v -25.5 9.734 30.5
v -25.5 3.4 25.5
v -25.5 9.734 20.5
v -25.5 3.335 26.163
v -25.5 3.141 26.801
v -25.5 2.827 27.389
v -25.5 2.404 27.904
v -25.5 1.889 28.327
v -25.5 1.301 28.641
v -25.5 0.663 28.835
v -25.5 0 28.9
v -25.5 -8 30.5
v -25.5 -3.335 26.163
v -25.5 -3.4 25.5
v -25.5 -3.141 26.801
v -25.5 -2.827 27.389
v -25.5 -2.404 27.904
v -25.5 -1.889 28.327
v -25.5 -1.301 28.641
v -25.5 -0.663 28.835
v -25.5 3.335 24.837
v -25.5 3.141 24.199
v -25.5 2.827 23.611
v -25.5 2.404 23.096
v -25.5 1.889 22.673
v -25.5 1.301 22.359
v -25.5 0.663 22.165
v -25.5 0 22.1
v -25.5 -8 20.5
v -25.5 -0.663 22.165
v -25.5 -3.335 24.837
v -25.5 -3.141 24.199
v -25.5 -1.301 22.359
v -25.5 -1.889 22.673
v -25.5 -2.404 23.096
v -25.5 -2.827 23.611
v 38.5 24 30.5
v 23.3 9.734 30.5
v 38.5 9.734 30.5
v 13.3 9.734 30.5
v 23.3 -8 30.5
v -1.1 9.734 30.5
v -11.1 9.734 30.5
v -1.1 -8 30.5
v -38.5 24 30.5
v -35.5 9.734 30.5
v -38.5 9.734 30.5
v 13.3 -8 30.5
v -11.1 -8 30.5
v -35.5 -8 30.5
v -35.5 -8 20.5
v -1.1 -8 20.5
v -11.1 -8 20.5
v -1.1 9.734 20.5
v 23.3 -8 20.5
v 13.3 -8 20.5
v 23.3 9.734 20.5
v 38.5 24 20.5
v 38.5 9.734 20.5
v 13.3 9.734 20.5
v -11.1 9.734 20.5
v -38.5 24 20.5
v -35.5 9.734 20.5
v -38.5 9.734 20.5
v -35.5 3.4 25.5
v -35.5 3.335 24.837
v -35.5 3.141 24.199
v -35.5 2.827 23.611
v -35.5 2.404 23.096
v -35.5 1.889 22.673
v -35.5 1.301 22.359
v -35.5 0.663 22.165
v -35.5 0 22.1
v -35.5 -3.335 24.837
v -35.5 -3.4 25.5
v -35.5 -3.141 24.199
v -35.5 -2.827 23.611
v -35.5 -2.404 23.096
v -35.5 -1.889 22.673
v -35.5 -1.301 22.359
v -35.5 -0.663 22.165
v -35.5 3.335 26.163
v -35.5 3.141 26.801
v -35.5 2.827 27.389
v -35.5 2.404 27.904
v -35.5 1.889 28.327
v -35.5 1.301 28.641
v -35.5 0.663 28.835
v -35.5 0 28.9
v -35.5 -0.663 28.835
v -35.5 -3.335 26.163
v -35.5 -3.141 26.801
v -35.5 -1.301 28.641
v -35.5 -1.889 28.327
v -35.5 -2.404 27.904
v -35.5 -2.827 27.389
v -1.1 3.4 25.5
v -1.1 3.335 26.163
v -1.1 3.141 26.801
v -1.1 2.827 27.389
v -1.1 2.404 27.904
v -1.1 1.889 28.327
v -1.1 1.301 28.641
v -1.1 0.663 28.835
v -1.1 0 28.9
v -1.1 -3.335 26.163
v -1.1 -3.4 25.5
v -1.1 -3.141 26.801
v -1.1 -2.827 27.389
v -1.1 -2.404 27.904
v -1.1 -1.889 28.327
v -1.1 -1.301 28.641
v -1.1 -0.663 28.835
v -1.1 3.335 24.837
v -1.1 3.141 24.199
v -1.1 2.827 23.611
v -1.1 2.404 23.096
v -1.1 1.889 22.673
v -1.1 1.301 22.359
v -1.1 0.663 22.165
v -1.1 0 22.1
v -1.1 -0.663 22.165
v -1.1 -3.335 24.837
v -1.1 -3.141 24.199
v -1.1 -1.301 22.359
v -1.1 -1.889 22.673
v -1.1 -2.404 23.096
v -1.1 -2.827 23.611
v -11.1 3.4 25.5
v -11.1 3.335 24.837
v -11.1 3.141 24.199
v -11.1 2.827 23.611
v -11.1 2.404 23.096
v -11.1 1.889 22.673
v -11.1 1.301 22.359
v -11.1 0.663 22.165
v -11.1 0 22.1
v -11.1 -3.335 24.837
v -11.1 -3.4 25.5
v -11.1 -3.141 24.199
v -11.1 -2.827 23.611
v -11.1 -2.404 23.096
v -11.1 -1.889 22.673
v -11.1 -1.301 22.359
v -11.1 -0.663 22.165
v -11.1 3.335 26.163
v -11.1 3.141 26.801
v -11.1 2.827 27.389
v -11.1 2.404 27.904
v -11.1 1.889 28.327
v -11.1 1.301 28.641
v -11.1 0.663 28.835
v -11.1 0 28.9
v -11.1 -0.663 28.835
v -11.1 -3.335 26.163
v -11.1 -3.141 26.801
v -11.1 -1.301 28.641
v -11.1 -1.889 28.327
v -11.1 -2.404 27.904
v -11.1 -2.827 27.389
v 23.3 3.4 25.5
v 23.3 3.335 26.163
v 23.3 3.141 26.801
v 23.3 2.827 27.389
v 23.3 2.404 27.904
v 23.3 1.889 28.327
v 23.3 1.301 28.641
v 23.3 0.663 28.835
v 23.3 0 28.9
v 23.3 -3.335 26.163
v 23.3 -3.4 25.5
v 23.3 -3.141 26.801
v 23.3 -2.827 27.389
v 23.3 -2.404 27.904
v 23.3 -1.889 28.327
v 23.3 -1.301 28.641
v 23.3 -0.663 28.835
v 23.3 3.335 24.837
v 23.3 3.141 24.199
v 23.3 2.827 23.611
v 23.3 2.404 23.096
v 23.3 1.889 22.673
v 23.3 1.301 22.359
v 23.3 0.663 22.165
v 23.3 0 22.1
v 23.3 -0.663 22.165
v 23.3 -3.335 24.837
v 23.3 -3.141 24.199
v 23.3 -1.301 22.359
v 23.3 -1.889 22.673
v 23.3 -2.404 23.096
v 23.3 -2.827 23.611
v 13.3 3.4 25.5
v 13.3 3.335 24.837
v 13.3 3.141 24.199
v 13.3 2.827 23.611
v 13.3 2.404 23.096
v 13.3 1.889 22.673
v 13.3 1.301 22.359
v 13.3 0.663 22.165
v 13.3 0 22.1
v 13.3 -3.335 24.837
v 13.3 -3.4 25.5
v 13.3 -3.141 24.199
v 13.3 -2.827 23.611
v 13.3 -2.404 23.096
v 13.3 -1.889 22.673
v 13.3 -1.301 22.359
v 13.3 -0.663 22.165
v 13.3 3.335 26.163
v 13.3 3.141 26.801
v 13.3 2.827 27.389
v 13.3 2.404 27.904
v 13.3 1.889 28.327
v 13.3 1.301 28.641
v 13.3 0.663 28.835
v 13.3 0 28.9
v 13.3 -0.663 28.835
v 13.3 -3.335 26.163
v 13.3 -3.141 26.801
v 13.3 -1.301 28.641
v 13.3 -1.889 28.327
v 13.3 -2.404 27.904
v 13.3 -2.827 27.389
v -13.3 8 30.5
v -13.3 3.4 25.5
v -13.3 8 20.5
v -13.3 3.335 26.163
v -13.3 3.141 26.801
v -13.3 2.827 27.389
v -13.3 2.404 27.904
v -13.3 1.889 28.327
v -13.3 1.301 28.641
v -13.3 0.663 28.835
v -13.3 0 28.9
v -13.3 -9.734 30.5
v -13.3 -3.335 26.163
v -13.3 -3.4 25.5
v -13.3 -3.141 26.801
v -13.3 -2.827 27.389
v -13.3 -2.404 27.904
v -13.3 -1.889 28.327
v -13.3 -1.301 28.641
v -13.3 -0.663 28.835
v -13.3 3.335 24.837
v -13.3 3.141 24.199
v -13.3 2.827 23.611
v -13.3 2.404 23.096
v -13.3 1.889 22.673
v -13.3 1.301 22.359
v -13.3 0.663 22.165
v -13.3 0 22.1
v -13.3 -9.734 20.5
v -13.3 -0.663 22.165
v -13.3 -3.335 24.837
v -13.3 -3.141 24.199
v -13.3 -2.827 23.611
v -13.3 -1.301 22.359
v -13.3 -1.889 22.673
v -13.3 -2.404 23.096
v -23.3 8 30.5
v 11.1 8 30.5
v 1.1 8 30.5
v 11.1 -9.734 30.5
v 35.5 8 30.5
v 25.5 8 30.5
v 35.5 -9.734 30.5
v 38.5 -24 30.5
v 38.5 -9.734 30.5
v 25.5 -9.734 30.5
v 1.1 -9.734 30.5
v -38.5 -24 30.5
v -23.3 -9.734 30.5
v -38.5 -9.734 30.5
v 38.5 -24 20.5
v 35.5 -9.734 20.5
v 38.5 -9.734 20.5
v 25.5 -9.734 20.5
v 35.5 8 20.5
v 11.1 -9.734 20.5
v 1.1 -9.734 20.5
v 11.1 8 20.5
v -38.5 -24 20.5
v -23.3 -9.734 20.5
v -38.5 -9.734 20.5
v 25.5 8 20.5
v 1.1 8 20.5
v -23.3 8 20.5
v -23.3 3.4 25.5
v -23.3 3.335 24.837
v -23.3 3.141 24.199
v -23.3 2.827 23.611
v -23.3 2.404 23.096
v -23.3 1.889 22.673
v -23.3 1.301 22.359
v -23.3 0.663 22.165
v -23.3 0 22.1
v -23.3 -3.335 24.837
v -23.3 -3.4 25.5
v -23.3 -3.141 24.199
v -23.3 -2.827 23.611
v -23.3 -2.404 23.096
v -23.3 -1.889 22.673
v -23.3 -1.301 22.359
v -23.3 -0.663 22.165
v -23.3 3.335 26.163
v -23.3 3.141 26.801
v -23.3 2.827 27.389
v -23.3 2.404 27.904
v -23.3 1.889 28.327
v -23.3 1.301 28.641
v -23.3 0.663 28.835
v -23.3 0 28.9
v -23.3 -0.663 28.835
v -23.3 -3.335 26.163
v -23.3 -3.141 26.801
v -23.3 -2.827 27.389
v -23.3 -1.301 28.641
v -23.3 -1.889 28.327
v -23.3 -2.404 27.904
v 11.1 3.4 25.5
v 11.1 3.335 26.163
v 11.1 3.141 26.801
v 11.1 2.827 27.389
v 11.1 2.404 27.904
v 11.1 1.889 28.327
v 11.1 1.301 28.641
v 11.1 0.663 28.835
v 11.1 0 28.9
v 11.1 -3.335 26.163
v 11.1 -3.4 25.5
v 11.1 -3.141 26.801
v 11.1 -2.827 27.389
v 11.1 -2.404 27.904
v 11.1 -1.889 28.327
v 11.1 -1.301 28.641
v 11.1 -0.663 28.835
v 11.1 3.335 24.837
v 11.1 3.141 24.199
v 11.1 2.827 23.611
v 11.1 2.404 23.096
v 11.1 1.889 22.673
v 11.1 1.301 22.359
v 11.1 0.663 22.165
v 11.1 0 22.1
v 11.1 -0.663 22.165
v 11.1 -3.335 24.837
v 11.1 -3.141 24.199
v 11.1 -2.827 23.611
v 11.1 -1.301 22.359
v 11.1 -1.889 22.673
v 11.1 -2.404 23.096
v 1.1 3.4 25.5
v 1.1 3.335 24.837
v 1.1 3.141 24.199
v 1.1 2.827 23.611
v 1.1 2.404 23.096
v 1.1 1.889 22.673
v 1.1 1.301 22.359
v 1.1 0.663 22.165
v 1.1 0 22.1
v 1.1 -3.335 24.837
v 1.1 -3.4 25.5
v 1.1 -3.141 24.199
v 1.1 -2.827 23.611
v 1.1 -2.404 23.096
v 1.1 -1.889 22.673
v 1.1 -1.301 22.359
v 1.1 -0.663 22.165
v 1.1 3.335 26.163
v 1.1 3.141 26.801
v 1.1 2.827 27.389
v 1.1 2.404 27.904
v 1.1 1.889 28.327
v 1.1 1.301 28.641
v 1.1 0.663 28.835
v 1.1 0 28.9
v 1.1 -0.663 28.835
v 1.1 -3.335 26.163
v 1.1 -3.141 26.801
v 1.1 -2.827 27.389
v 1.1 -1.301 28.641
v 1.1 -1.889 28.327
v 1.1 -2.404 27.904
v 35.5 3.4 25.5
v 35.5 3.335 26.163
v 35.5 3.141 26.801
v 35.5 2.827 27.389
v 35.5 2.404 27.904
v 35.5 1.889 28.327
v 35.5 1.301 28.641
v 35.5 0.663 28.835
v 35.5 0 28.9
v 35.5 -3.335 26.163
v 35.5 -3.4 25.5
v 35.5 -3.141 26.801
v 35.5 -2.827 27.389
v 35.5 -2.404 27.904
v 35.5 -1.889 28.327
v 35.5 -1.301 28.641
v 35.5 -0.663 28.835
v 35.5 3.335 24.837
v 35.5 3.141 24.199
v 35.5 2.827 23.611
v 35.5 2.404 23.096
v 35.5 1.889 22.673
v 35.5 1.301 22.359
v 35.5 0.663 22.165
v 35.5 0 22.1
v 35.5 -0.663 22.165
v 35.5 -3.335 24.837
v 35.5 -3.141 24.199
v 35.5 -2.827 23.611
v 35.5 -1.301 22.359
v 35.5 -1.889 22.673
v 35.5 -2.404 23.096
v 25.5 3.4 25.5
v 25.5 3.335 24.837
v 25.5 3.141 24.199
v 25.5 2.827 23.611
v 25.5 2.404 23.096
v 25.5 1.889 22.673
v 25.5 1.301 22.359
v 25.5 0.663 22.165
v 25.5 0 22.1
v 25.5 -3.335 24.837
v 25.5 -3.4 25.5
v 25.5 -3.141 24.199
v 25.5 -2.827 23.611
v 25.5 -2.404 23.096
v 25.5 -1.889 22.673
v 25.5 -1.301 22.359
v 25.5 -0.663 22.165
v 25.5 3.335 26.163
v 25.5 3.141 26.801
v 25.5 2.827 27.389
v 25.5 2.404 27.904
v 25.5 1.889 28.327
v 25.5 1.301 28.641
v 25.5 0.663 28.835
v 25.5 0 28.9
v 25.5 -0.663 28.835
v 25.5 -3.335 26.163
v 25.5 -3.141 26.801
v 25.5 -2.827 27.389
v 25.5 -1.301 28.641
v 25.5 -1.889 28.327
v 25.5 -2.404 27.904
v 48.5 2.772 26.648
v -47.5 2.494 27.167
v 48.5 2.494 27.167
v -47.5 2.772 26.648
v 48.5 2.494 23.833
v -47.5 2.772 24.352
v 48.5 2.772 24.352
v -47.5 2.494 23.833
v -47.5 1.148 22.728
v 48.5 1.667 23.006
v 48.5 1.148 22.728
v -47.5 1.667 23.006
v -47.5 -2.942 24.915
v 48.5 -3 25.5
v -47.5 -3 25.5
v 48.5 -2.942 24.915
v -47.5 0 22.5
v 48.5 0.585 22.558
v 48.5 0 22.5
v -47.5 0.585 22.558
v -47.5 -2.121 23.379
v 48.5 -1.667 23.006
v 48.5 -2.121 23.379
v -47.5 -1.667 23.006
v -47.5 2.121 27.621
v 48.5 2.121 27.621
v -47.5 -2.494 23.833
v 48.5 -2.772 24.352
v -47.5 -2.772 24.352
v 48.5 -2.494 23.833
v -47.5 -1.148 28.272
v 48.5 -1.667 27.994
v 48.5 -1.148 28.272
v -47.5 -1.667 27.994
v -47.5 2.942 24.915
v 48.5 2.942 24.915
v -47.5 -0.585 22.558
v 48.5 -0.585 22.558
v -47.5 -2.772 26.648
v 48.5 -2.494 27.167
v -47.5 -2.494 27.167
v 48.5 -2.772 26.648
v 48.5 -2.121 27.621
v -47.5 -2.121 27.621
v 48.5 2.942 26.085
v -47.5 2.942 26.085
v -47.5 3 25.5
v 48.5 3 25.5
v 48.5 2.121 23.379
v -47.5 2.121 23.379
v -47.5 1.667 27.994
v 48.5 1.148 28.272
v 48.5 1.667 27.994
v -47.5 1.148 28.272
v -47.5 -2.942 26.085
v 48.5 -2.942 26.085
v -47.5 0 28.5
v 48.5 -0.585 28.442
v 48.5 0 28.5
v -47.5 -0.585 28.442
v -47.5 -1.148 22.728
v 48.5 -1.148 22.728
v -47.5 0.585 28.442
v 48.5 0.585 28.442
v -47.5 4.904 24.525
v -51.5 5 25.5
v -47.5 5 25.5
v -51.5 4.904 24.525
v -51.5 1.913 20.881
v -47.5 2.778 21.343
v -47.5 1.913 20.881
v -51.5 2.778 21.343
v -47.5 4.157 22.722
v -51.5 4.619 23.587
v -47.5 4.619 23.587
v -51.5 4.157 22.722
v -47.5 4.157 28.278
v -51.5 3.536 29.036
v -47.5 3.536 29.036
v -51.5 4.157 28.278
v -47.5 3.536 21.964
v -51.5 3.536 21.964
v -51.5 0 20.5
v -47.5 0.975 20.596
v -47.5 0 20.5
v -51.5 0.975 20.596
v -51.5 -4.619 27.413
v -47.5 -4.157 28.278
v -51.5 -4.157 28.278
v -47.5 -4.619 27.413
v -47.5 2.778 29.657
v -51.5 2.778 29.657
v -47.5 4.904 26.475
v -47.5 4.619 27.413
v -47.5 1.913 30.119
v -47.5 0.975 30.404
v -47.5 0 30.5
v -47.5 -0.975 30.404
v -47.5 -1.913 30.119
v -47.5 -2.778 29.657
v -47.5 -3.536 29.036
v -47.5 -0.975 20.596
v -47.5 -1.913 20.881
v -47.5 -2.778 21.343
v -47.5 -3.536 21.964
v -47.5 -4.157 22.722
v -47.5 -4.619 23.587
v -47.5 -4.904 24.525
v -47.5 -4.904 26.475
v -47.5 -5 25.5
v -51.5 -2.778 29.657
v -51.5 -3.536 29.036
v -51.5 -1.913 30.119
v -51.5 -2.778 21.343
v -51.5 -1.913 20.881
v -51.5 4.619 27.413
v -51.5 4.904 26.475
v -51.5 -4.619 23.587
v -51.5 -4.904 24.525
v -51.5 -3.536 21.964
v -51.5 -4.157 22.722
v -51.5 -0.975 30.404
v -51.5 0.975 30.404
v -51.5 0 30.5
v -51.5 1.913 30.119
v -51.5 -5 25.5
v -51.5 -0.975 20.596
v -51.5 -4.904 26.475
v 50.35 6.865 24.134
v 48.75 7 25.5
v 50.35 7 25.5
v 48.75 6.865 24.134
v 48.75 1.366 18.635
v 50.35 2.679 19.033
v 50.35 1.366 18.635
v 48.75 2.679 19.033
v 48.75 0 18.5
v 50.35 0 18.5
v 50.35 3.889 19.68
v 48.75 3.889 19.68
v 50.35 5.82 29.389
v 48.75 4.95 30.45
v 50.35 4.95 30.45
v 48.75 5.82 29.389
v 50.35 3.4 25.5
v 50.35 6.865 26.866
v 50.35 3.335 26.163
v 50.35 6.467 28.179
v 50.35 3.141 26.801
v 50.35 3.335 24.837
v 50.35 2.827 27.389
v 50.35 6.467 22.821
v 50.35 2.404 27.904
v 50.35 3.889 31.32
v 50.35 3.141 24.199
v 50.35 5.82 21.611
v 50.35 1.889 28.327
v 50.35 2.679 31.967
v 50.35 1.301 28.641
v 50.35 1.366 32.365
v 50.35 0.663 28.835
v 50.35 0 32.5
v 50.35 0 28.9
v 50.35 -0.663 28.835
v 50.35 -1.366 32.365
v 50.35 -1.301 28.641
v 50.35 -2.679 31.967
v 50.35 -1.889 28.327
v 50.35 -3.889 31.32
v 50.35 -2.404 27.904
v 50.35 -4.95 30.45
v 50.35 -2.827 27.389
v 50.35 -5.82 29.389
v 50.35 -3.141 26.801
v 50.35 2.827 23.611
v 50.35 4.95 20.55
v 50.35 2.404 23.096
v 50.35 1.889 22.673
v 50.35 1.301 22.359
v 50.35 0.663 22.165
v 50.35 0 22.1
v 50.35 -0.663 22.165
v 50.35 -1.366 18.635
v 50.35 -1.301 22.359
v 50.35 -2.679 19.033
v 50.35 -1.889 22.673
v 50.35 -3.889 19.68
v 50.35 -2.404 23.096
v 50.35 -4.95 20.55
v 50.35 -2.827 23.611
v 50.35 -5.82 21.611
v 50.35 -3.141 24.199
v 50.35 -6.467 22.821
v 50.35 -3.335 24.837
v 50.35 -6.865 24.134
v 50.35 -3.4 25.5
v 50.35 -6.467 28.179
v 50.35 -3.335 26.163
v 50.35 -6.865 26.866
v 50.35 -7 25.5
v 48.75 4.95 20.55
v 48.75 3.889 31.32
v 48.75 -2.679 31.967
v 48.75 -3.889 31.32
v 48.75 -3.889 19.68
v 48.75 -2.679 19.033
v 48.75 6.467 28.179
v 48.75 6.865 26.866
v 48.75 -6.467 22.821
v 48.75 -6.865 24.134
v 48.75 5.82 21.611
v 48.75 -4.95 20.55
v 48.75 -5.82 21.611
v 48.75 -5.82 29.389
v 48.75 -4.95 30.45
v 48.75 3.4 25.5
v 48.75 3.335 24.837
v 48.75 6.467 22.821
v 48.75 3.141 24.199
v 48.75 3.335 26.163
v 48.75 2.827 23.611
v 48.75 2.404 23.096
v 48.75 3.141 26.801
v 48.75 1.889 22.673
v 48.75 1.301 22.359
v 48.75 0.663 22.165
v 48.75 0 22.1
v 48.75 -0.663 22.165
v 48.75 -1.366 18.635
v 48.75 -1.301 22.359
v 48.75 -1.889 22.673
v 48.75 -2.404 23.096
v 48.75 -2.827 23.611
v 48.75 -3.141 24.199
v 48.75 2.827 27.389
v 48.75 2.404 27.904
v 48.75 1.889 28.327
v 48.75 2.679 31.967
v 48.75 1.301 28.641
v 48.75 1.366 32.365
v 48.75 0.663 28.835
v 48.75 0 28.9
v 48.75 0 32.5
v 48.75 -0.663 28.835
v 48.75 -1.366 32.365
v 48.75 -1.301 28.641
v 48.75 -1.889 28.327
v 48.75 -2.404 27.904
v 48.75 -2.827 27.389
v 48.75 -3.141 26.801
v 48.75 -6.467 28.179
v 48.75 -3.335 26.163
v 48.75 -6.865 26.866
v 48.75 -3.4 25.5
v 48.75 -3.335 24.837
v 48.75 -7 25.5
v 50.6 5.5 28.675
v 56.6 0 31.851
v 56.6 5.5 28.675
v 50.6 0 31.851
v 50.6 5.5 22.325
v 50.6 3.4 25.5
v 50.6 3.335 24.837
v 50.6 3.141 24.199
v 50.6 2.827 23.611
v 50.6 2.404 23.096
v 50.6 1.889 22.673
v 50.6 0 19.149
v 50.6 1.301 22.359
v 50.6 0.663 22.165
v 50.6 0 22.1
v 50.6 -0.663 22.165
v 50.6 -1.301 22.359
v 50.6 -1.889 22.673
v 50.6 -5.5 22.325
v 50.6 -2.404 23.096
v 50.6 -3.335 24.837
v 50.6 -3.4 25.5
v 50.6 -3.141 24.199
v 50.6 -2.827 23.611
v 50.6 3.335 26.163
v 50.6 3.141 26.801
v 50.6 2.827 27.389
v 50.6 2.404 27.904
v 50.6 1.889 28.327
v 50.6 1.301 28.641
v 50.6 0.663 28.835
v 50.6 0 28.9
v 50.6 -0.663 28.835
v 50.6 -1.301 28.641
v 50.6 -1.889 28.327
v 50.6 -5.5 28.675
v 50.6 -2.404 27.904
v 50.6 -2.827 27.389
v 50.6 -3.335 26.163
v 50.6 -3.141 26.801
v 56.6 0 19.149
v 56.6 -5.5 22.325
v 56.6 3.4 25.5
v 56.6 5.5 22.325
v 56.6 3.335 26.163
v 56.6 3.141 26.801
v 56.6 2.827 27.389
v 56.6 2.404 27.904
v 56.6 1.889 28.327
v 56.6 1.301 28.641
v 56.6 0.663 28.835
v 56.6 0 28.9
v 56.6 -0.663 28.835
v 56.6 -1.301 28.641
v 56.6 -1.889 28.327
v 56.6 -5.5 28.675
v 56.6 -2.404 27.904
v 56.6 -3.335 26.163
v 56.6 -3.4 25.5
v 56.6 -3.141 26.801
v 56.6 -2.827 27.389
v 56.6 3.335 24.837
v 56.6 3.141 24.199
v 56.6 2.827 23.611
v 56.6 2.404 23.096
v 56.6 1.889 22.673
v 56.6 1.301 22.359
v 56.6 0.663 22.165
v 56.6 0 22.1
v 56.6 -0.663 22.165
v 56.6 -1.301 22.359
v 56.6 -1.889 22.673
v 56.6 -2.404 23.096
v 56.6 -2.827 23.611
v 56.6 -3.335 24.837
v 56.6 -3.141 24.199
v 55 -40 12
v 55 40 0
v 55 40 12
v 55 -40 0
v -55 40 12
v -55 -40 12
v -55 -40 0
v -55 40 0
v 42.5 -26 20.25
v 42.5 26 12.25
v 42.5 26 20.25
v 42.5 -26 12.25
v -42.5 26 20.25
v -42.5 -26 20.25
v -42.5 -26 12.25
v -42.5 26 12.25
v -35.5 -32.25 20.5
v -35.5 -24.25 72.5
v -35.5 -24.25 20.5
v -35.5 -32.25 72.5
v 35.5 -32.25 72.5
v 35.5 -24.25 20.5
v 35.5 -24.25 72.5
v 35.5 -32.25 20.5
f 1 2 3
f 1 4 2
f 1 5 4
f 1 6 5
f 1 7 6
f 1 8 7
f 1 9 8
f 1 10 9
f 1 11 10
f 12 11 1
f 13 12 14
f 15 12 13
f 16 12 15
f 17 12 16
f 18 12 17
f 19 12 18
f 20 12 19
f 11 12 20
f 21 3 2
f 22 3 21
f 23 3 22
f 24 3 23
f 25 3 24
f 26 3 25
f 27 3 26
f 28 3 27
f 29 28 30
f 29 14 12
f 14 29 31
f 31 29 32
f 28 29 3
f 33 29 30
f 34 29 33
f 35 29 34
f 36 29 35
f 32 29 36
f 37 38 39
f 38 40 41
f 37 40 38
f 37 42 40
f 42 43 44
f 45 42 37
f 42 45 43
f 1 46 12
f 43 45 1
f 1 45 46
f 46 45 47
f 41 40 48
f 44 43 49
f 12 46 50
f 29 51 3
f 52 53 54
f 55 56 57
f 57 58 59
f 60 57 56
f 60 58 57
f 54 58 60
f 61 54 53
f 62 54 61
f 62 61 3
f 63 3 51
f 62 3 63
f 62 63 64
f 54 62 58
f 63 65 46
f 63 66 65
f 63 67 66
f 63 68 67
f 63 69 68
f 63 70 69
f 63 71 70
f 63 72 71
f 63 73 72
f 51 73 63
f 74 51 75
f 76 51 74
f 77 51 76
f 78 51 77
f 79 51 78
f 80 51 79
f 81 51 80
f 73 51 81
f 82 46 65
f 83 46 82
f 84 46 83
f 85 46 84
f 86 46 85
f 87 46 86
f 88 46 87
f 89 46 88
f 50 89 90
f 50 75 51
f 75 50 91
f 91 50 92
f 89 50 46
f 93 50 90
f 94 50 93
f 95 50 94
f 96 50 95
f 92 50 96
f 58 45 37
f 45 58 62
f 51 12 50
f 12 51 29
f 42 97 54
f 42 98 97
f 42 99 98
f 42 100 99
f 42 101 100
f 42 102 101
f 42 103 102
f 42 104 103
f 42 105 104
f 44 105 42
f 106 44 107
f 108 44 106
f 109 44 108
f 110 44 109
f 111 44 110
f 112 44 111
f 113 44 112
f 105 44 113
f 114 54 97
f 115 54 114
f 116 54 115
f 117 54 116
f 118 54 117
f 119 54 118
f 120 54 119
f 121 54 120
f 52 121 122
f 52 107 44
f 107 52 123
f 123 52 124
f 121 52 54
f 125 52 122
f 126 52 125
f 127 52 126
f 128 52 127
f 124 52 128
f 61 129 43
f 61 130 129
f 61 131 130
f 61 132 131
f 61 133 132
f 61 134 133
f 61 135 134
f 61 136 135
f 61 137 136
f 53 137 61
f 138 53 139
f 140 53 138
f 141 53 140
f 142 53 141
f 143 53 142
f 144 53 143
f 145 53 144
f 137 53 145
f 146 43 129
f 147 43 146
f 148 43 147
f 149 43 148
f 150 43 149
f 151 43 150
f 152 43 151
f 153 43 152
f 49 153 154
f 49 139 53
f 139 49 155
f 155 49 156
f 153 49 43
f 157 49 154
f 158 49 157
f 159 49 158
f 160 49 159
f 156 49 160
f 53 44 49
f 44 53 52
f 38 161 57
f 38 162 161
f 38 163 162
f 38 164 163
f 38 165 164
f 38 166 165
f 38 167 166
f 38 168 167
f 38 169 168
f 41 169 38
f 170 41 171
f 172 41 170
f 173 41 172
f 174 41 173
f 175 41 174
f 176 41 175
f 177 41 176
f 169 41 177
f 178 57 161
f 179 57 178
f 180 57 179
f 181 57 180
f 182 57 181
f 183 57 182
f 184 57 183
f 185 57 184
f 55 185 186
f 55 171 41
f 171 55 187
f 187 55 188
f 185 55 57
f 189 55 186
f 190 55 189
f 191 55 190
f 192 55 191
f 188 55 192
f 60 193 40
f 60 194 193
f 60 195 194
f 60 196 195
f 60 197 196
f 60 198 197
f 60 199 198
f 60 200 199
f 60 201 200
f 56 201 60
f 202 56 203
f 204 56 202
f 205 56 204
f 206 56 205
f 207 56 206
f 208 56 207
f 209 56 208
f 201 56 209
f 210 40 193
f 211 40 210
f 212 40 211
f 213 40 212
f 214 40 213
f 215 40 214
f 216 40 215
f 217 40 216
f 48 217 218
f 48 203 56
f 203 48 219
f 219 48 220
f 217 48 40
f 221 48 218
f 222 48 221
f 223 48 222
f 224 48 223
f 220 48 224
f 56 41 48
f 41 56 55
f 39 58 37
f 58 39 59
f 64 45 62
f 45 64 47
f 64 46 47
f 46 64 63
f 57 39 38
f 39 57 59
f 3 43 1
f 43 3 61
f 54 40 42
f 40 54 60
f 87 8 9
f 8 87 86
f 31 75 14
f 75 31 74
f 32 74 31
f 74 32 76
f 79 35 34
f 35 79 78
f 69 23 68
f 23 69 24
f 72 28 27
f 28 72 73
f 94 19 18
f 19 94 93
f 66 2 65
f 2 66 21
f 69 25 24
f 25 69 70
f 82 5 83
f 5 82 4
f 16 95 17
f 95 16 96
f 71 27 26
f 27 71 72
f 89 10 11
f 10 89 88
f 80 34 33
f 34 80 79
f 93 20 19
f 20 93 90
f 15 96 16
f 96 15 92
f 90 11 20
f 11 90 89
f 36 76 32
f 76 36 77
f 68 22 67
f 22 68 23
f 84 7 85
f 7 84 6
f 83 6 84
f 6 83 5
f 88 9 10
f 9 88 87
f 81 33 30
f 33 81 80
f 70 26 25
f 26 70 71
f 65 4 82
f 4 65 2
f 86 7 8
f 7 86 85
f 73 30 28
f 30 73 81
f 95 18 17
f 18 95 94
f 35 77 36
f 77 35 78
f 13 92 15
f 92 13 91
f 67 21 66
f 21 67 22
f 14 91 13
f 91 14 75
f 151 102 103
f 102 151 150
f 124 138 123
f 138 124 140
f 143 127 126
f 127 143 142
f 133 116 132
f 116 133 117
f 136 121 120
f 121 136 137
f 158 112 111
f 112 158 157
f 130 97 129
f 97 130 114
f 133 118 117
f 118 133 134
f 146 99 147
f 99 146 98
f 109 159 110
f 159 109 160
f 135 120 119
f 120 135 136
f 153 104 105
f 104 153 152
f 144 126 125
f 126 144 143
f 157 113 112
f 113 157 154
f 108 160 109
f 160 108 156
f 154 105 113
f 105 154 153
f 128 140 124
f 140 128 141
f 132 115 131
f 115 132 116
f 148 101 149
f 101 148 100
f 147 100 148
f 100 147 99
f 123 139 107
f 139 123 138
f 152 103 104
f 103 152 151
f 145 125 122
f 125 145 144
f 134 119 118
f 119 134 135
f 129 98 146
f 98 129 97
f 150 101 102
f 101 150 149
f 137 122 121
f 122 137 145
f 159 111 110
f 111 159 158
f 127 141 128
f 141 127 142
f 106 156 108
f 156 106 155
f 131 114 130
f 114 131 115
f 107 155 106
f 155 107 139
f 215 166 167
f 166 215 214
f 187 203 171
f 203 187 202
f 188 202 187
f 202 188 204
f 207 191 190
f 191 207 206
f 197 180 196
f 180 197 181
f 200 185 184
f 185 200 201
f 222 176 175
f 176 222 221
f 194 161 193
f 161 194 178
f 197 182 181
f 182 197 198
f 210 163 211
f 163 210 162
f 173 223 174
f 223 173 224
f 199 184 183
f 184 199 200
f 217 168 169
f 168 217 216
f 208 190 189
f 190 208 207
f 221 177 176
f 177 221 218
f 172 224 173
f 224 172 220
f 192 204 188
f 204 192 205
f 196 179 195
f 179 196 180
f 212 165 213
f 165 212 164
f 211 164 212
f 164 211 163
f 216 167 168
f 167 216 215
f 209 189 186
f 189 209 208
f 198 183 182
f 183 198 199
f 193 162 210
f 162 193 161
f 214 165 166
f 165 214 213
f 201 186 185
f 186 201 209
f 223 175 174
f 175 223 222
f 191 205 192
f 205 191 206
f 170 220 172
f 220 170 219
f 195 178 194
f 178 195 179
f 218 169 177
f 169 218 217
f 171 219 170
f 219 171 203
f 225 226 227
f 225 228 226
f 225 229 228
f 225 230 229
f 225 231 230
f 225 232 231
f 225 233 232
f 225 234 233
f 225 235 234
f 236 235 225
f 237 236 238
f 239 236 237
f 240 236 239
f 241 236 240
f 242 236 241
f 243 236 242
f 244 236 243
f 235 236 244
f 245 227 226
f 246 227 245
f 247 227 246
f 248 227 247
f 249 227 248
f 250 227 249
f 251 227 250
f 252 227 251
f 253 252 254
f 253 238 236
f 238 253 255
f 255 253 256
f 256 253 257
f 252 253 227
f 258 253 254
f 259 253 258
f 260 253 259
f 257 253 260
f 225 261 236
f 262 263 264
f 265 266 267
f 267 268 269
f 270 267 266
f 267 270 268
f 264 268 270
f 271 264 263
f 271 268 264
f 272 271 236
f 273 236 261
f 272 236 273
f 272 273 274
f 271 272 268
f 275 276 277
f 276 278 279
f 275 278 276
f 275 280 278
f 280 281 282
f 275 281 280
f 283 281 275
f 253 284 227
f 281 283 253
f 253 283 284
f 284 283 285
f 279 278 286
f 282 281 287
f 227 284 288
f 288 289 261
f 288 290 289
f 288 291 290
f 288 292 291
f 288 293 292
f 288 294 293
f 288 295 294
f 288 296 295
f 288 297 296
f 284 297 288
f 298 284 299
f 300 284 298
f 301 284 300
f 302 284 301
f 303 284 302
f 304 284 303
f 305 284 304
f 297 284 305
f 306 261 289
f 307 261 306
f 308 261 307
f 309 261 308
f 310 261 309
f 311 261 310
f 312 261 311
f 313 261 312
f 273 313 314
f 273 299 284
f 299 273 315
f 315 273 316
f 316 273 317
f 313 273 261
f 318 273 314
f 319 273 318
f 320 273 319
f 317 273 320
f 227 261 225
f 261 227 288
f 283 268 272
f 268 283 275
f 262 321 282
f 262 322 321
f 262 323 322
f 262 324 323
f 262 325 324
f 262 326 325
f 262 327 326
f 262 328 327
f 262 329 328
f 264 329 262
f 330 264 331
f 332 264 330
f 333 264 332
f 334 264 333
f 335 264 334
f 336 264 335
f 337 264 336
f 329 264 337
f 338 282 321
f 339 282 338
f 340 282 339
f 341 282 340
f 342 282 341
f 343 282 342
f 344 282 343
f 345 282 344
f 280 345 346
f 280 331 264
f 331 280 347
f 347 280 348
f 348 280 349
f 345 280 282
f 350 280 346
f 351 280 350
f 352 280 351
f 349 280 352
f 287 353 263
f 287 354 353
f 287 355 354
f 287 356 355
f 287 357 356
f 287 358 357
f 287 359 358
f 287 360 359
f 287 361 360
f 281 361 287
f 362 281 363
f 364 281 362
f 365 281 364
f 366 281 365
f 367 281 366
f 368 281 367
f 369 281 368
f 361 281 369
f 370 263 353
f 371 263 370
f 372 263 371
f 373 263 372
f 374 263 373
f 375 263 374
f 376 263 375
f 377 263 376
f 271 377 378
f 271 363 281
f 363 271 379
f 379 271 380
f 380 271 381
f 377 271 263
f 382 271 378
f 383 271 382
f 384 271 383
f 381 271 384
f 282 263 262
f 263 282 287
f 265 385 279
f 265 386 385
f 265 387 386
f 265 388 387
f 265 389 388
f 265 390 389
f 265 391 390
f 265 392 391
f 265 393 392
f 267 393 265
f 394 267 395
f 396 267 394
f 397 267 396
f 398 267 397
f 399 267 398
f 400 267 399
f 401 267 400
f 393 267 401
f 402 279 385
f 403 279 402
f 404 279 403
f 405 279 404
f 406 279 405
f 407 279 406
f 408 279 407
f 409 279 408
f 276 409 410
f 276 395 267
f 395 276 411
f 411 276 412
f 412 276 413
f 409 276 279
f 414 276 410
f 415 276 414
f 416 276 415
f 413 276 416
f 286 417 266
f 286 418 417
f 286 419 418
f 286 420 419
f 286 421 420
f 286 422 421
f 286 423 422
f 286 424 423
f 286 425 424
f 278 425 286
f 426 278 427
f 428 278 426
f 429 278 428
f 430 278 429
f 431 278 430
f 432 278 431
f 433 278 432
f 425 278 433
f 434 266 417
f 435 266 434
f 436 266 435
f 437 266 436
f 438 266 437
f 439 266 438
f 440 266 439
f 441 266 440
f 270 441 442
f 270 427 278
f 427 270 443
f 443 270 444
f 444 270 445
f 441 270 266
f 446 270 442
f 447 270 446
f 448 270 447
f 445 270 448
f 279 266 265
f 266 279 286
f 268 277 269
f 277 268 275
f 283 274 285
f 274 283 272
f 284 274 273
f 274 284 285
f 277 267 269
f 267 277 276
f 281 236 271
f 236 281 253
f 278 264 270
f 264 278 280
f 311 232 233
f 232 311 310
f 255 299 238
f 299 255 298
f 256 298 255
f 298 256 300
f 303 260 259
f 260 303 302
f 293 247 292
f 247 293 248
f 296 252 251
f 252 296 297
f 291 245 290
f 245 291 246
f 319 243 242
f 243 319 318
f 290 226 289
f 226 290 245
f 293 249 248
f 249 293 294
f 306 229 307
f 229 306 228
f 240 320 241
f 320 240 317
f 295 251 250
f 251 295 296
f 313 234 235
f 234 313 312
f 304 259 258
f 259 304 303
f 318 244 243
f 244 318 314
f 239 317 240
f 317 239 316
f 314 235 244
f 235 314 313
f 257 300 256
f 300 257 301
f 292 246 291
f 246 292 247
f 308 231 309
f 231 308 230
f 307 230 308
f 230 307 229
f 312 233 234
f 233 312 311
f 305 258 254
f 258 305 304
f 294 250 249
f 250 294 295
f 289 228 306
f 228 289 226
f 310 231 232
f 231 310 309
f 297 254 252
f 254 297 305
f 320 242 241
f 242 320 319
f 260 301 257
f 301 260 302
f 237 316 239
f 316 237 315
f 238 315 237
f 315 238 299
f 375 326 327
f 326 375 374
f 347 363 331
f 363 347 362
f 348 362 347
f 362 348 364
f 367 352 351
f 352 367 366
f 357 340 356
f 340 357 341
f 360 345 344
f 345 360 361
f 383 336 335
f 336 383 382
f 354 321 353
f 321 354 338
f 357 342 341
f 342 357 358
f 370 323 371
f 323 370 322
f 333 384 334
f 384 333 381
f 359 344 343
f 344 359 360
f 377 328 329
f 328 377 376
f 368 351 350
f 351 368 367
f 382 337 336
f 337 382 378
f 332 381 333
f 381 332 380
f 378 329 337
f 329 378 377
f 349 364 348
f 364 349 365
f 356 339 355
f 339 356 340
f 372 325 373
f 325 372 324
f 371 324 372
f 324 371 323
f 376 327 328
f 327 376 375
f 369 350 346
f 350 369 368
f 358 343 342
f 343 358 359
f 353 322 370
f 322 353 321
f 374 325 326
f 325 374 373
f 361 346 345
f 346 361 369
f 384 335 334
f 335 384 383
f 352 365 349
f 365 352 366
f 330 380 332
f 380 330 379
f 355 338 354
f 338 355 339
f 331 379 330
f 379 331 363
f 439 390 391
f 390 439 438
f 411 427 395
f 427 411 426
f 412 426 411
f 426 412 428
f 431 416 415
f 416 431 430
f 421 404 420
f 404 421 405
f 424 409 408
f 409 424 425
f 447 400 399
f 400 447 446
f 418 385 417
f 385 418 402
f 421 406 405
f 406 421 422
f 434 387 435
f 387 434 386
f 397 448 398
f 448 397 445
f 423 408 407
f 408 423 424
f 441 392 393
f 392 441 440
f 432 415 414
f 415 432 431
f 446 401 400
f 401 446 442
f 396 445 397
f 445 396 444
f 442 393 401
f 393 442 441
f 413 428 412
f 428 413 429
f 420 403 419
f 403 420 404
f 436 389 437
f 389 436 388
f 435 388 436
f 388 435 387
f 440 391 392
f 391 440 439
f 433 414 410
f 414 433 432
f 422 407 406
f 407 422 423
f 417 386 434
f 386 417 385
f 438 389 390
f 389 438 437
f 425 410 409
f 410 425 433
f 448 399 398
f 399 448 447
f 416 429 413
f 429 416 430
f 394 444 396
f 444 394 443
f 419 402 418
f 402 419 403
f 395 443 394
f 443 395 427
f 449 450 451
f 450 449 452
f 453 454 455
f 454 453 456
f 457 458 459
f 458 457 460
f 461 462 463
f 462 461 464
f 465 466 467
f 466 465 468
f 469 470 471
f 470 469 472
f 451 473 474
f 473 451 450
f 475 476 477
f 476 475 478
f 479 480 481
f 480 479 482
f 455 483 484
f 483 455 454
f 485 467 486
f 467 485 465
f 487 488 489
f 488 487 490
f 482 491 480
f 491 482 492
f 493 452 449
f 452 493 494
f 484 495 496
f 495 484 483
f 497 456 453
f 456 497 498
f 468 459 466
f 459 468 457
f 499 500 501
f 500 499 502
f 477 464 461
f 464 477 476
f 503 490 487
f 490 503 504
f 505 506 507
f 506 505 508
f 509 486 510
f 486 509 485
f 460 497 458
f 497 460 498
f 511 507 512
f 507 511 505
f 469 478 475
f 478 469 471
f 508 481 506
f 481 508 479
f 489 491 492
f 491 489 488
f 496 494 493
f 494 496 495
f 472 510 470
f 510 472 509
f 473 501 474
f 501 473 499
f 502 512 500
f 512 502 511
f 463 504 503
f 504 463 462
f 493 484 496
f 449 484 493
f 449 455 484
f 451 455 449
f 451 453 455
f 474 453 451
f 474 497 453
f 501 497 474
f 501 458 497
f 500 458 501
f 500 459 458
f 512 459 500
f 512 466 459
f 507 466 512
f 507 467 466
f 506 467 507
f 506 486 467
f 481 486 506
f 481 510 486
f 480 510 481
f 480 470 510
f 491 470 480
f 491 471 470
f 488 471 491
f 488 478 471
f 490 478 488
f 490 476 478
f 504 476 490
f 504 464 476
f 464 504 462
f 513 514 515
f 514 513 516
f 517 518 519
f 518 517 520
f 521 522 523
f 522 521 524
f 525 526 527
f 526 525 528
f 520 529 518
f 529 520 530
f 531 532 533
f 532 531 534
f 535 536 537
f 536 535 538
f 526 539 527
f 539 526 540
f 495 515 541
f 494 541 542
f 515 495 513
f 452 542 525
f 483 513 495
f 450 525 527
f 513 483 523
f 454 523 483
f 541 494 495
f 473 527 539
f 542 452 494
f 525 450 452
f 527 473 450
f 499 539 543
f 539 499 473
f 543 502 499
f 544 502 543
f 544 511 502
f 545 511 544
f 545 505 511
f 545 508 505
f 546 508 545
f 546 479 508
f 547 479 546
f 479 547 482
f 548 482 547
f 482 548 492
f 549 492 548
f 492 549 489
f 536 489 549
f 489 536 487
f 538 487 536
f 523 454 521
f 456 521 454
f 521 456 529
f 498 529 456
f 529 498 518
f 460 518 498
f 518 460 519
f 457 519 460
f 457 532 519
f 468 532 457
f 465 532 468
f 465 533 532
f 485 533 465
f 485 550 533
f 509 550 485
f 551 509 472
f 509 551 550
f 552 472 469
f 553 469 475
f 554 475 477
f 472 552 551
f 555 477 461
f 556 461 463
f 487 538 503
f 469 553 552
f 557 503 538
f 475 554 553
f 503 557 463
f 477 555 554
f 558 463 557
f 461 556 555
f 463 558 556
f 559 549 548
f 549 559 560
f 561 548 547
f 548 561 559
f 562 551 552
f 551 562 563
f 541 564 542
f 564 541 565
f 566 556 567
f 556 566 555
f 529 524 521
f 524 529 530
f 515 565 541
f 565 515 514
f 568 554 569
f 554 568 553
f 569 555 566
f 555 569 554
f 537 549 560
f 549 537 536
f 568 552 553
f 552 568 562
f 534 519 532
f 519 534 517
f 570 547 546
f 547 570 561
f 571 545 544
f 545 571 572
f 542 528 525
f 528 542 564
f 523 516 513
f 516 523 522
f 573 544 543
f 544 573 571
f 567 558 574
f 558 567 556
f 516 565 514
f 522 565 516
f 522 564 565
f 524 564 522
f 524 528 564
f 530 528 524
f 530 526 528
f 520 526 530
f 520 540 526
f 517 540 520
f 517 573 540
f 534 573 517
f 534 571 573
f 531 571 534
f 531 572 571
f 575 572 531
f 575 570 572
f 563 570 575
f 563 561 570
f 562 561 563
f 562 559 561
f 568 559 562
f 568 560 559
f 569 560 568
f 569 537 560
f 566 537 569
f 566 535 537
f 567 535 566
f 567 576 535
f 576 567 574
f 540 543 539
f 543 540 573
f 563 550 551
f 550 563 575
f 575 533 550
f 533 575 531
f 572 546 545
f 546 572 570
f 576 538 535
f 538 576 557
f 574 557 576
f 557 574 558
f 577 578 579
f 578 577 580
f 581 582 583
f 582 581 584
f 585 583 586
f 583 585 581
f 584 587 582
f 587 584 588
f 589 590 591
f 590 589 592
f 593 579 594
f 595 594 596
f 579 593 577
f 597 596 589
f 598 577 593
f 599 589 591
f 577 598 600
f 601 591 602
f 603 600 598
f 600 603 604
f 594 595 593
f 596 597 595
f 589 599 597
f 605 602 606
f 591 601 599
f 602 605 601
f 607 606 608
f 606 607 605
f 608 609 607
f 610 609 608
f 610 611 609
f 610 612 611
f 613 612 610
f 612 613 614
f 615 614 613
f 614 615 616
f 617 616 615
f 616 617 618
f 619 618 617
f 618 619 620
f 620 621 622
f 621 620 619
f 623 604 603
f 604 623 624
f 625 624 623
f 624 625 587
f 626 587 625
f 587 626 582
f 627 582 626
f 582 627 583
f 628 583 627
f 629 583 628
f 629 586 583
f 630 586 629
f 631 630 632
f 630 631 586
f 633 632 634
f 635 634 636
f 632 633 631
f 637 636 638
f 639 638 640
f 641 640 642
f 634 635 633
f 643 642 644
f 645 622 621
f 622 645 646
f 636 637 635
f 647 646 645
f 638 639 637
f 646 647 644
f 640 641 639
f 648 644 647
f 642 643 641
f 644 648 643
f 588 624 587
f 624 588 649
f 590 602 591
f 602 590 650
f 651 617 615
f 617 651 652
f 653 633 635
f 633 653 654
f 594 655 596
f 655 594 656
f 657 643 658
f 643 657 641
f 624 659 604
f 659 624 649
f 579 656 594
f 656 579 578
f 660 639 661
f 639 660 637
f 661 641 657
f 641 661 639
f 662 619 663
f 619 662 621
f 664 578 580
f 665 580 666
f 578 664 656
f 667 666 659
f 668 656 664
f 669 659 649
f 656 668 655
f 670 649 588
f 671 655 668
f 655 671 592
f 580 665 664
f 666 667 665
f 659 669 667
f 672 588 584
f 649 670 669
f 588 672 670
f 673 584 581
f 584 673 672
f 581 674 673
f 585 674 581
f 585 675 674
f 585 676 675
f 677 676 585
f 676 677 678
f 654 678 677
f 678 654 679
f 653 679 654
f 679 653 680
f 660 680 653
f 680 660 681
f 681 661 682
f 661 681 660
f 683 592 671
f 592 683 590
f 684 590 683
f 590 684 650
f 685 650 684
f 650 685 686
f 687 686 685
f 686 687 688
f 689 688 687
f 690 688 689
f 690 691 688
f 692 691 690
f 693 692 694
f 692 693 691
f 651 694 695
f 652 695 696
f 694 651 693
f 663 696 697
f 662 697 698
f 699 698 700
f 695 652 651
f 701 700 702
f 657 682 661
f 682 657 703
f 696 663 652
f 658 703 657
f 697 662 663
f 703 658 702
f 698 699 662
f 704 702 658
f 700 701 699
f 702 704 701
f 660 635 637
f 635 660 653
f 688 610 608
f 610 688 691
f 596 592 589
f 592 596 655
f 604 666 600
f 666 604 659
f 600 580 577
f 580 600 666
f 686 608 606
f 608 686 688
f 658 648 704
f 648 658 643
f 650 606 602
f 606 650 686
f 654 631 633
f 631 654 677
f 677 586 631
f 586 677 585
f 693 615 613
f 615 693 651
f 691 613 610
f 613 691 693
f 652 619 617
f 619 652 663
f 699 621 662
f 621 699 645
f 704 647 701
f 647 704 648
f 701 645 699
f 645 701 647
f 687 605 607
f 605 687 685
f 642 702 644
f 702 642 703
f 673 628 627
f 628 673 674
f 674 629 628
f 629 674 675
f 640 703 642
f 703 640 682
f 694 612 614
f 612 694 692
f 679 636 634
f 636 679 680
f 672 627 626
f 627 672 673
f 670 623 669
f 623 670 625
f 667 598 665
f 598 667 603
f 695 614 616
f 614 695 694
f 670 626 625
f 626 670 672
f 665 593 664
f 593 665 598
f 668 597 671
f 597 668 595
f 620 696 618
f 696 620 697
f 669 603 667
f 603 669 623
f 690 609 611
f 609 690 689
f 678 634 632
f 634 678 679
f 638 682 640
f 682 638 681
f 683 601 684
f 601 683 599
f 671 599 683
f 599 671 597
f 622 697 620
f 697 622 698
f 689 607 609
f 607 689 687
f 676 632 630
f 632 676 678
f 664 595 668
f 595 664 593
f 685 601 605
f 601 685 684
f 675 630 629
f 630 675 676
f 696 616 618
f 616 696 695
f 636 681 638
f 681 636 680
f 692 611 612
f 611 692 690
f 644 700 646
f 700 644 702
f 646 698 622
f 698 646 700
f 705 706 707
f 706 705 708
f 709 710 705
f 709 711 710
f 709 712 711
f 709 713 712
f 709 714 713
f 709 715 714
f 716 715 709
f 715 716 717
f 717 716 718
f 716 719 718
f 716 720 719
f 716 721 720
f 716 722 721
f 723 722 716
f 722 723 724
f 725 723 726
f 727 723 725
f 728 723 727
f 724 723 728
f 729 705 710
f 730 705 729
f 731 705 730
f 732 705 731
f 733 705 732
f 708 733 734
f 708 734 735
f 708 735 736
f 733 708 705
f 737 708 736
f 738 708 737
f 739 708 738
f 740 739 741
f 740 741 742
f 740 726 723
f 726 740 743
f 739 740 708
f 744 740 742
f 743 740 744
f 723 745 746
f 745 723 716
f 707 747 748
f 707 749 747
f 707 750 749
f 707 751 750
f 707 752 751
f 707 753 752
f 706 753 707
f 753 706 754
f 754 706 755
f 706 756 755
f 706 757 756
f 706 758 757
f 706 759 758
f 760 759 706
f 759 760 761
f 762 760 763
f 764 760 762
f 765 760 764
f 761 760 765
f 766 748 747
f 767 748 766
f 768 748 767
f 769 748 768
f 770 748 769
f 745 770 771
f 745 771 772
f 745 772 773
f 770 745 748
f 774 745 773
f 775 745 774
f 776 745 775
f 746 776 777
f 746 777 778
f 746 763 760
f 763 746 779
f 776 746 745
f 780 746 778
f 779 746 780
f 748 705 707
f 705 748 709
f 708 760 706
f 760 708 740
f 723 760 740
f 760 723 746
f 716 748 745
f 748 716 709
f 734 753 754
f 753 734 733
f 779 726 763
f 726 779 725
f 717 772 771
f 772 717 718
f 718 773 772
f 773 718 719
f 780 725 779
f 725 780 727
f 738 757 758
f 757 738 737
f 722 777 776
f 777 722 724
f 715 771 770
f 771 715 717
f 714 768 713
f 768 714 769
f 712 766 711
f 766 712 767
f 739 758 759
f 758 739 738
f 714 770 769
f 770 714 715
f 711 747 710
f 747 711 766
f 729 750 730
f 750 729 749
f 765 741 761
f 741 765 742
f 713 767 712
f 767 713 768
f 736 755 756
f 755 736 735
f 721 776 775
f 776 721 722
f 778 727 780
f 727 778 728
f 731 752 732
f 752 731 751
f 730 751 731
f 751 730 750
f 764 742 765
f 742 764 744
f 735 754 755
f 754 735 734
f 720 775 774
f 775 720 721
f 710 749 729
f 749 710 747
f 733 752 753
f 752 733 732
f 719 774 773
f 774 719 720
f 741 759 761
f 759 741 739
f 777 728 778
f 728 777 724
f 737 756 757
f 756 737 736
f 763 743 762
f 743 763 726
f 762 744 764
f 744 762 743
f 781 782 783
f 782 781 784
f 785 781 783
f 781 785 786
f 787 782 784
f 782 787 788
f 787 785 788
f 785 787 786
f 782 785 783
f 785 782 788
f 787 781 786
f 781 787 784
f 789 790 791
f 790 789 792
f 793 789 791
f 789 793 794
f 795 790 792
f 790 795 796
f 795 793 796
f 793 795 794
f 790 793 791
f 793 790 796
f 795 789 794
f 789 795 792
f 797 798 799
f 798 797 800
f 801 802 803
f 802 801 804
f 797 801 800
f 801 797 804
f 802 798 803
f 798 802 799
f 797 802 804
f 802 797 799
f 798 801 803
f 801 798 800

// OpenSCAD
$fn = 32;

// ------------------------------------------------------------------------
// Comb hinge with flap: leaf 77 x 24 mm, pin d6, flap 52 mm
// Every part is its own module, assembly() places every instance.
// ------------------------------------------------------------------------

// --- part 1 ---
module hinge_bed() {
  difference() {
    translate([-55, -40, 0]) cube([110, 80, 12]);
  }
}

// --- part 2 ---
module hinge_riser() {
  difference() {
    translate([-42.5, -26, 0]) cube([85, 52, 8]);
  }
}

// --- part 3 ---
module hinge_leaf_a() {
  difference() {
    union() {
      translate([-35.5, -8, -5]) cube([10, 32, 10]);
      translate([-11.1, -8, -5]) cube([10, 32, 10]);
      translate([13.3, -8, -5]) cube([10, 32, 10]);
      translate([-38.5, 9.734, -5]) cube([77, 14.266, 10]);
    }
    translate([-30.5, 0, 0]) rotate([0, 90, 0]) cylinder(h = 12, d = 6.8, center = true);
    translate([-6.1, 0, 0]) rotate([0, 90, 0]) cylinder(h = 12, d = 6.8, center = true);
    translate([18.3, 0, 0]) rotate([0, 90, 0]) cylinder(h = 12, d = 6.8, center = true);
  }
}

// --- part 4 ---
module hinge_leaf_b() {
  difference() {
    union() {
      translate([-23.3, -24, -5]) cube([10, 32, 10]);
      translate([1.1, -24, -5]) cube([10, 32, 10]);
      translate([25.5, -24, -5]) cube([10, 32, 10]);
      translate([-38.5, -24, -5]) cube([77, 14.266, 10]);
    }
    translate([-18.3, 0, 0]) rotate([0, 90, 0]) cylinder(h = 12, d = 6.8, center = true);
    translate([6.1, 0, 0]) rotate([0, 90, 0]) cylinder(h = 12, d = 6.8, center = true);
    translate([30.5, 0, 0]) rotate([0, 90, 0]) cylinder(h = 12, d = 6.8, center = true);
  }
}

// --- part 5 ---
module hinge_flap() {
  difference() {
    translate([-35.5, -26, 0]) cube([71, 52, 8]);
  }
}

// --- part 6 ---
module hinge_pin() {
  rotate([0, 90, 0]) cylinder(h = 97, d = 6, center = true);
  translate([-51.5, 0, 0]) rotate([0, 90, 0]) cylinder(h = 4, d = 10);
}

// --- part 7 ---
module pin_washer() {
  difference() {
      translate([0, 0, 0]) cylinder(h = 1.6, d = 14);
      translate([0, 0, -1]) cylinder(h = 3.6, d = 6.8);
    }
}

// --- part 8 ---
module pin_nut() {
  difference() {
    linear_extrude(height = 6) polygon(points = [[6.351, 0], [3.175, 5.5], [-3.175, 5.5], [-6.351, 0], [-3.175, -5.5], [3.175, -5.5]]);
    translate([0, 0, -1]) cylinder(h = 8, d = 6.8);
  }
}

// --- assembly ---
module assembly() {
  color([0.80, 0.24, 0.20]) translate([0, 0, 0]) rotate([0, 0, 0]) hinge_bed();
  color([0.20, 0.45, 0.75]) translate([0, 0, 12.25]) rotate([0, 0, 0]) hinge_riser();
  color([0.25, 0.62, 0.32]) translate([0, 0, 25.5]) rotate([0, 0, 0]) hinge_leaf_a();
  color([0.92, 0.70, 0.18]) translate([0, 0, 25.5]) rotate([0, 0, 0]) hinge_leaf_b();
  color([0.58, 0.35, 0.70]) translate([0, -24.25, 46.5]) rotate([90, 0, 0]) hinge_flap();
  color([0.16, 0.66, 0.66]) translate([0, 0, 25.5]) rotate([0, 0, 0]) hinge_pin();
  color([0.85, 0.48, 0.18]) translate([48.75, 0, 25.5]) rotate([0, 90, 0]) pin_washer();
  color([0.55, 0.60, 0.65]) translate([50.6, 0, 25.5]) rotate([0, 90, 0]) pin_nut();
}

assembly();
